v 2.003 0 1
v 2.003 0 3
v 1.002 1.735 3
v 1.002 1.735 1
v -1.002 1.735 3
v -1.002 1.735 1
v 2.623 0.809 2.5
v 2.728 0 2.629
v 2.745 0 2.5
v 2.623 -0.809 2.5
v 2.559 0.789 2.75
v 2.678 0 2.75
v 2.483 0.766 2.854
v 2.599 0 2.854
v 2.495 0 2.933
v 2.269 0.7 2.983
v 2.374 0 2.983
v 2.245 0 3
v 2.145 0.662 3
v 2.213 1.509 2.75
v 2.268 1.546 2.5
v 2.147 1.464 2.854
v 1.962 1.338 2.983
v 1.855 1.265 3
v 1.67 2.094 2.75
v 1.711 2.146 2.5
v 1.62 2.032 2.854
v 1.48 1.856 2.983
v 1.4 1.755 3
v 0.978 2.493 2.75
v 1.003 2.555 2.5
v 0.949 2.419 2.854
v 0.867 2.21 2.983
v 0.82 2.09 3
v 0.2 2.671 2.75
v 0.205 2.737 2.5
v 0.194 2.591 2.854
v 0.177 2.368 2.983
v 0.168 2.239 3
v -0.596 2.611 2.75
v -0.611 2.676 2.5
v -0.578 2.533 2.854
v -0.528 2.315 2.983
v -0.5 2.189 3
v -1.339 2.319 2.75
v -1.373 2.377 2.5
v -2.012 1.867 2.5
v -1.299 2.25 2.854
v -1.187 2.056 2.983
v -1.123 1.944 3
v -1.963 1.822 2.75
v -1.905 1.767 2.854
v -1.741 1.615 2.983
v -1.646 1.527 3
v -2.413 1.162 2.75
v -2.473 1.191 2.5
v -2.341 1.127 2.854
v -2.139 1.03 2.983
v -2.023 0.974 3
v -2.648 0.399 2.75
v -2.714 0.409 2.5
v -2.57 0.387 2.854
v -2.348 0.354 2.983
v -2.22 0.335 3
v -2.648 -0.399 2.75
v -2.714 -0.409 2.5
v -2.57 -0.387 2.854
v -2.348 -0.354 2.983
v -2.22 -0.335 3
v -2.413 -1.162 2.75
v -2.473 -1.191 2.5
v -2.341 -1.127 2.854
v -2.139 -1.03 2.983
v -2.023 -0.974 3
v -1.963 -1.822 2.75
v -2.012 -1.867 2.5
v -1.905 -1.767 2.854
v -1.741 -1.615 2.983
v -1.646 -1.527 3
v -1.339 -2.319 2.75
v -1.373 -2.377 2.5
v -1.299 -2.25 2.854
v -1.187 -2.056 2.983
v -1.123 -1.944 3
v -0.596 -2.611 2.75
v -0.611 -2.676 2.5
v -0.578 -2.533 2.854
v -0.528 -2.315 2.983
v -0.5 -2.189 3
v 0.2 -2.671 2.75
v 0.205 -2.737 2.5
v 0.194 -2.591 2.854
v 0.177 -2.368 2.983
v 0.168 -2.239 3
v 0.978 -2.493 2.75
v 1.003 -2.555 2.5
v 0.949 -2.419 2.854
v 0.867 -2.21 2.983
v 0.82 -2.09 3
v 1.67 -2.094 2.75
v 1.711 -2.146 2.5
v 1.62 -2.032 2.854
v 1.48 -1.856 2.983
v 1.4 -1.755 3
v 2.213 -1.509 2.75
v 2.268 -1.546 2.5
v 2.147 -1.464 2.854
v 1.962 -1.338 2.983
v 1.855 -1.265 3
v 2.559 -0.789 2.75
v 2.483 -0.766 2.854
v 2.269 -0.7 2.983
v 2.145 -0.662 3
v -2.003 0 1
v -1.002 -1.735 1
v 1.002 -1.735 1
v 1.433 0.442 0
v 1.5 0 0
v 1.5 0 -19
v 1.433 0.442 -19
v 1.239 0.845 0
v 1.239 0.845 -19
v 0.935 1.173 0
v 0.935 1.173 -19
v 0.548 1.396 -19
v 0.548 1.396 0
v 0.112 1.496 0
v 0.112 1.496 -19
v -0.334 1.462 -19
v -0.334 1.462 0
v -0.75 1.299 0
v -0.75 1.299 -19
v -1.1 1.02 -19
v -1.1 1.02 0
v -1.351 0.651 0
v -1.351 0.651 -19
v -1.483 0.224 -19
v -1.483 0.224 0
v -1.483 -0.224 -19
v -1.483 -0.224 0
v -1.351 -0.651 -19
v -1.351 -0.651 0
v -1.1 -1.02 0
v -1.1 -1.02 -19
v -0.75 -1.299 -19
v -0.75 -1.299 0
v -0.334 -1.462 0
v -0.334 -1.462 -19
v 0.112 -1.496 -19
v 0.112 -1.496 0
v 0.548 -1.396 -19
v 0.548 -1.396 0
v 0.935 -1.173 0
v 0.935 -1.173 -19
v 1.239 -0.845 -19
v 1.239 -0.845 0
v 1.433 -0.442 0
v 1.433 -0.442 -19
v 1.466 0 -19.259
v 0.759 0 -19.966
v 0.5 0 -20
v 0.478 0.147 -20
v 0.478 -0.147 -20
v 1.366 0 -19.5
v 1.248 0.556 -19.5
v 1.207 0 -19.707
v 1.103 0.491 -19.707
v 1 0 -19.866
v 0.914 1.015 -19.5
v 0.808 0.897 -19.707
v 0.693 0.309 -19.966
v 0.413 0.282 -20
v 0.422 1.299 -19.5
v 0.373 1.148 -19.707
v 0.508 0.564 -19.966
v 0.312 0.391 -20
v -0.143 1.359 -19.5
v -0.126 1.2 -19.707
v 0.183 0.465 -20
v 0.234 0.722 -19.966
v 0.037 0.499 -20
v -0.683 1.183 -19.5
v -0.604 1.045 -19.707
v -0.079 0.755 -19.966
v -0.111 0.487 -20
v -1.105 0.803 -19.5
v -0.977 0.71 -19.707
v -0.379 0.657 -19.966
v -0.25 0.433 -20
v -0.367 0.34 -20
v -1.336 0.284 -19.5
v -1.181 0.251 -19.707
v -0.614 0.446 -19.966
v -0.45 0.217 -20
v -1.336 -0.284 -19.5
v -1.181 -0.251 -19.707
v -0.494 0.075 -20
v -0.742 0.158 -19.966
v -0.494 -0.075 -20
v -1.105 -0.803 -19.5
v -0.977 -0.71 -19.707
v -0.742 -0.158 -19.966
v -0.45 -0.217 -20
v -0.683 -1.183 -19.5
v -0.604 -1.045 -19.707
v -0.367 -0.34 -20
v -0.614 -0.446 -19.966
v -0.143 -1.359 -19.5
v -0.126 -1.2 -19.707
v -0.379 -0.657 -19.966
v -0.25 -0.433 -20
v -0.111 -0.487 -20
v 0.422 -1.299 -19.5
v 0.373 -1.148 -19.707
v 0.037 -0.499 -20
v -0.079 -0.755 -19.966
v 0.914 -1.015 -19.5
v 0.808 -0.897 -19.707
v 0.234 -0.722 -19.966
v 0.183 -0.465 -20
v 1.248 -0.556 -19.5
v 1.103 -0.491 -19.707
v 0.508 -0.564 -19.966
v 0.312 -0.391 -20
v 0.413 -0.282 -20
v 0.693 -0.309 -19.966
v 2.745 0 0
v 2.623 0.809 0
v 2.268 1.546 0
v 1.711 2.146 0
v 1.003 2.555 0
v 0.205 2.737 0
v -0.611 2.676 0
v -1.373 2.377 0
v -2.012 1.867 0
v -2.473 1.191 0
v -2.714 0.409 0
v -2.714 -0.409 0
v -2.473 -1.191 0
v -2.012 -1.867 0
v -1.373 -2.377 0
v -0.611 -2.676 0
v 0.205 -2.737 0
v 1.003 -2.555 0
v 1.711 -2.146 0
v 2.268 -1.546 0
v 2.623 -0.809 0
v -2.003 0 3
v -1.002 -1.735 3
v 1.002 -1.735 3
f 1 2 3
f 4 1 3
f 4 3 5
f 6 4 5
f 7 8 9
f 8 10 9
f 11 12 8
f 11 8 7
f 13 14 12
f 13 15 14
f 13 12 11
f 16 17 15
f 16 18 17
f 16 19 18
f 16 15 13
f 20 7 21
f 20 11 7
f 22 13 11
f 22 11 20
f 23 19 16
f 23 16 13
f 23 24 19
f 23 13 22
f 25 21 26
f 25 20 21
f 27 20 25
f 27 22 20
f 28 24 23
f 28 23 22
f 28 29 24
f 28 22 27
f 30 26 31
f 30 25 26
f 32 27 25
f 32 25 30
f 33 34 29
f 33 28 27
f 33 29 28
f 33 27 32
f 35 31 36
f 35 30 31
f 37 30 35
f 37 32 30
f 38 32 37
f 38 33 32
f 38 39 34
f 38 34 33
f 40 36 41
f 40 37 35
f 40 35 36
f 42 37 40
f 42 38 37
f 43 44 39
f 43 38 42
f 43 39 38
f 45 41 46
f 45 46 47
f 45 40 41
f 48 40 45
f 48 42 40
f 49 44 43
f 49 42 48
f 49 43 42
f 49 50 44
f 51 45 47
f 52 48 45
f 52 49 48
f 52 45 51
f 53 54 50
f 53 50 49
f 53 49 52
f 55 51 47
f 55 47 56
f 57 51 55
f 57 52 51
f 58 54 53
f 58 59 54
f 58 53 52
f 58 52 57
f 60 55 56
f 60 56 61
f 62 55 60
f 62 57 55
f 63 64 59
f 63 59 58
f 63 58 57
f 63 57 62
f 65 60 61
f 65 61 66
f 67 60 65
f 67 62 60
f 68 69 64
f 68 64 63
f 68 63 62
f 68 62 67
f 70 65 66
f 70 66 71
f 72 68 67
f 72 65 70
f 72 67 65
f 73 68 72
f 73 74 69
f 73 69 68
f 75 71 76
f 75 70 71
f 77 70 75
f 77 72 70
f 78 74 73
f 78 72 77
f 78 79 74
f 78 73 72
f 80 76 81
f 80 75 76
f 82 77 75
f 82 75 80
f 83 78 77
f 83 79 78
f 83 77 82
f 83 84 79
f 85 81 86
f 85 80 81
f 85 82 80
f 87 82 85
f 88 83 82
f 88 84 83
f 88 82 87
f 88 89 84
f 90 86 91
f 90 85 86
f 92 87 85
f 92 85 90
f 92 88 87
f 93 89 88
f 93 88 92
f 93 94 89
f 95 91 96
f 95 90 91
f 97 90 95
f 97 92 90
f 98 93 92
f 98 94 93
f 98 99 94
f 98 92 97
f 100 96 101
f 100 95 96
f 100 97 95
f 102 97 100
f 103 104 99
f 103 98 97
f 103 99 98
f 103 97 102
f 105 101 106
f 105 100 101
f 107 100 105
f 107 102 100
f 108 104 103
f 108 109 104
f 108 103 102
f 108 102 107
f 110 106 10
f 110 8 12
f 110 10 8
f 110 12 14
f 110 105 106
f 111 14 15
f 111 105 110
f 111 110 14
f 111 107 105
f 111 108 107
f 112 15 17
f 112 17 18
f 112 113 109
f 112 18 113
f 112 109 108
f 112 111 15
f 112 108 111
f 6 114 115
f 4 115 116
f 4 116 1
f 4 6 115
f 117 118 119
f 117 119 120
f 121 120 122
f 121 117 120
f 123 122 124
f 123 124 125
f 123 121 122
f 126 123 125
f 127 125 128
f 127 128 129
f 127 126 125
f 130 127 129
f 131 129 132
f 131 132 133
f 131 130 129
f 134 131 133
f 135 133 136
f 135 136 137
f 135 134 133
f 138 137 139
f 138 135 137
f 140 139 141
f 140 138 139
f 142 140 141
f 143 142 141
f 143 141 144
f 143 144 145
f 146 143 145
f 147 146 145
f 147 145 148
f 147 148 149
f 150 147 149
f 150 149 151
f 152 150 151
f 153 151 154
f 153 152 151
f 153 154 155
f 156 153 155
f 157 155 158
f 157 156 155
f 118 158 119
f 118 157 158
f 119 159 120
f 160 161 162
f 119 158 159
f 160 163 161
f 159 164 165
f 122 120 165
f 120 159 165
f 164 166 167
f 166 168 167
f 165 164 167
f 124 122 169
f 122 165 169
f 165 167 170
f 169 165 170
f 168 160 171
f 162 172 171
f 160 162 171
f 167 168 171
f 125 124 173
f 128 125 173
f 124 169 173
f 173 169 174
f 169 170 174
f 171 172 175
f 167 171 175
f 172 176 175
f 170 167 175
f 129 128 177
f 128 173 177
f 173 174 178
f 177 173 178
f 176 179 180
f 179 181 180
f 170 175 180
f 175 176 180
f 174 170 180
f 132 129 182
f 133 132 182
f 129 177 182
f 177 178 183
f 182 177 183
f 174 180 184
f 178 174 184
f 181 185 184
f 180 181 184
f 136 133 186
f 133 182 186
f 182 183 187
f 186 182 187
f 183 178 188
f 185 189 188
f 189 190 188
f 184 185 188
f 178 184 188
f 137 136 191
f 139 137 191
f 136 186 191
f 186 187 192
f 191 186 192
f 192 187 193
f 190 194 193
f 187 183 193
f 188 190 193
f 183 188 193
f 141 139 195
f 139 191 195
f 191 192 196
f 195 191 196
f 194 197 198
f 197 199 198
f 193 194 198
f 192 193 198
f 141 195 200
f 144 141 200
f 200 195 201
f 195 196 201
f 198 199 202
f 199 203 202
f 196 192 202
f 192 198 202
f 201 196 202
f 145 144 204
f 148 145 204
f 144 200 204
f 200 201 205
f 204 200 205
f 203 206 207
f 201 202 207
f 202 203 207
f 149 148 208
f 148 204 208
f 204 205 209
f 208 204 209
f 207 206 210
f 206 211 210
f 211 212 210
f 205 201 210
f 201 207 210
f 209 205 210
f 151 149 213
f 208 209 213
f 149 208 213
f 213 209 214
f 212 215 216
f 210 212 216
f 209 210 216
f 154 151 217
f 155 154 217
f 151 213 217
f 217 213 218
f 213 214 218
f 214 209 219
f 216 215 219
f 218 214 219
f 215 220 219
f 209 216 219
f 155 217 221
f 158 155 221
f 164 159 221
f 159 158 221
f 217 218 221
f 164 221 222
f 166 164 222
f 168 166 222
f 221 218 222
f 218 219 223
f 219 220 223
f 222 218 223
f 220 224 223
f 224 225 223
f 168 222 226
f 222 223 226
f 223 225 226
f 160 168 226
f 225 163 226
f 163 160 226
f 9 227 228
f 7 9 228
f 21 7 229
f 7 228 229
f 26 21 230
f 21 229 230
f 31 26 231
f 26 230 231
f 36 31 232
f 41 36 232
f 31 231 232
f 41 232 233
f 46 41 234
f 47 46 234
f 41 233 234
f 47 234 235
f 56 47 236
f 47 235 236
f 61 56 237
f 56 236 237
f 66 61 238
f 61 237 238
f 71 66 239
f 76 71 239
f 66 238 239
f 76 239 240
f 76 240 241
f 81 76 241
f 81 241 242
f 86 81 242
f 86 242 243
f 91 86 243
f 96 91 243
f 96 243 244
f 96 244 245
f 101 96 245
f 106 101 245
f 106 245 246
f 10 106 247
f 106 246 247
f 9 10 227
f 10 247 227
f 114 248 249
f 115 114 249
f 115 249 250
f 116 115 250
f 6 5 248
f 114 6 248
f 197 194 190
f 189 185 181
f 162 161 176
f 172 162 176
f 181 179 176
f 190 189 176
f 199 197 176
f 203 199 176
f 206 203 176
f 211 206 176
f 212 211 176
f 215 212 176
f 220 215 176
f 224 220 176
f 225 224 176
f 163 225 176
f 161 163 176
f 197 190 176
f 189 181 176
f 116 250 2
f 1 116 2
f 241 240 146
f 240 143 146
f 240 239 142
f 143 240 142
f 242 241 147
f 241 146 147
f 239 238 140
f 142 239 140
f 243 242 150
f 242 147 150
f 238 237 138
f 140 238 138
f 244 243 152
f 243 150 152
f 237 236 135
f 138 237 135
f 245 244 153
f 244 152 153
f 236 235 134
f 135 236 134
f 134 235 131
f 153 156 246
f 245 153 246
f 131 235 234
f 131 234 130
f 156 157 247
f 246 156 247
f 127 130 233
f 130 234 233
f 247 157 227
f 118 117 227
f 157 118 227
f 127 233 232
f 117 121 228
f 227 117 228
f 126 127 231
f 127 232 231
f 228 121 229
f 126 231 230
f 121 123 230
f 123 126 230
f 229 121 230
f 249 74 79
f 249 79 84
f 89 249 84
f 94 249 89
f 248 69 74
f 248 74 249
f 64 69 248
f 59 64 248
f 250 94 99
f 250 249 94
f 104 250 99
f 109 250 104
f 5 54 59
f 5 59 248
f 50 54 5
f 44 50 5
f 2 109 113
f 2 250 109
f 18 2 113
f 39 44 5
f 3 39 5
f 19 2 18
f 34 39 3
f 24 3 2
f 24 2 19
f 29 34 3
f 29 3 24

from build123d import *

# Parameters (mm, degrees)
SKETCH1_R          = 1.5
EXTRUDE1_DEPTH     = 20
SKETCH2_R          = 2.745016825
EXTRUDE2_DEPTH     = 3
CUT_EXTRUDE1_DEPTH = 2
FILLET1_R          = 0.5
FILLET2_R          = 1


with BuildPart() as part:
    # Sketch1 → Extrude1 (new body)
    with BuildSketch(Plane.XY):
        Circle(SKETCH1_R)
    extrude(amount=-EXTRUDE1_DEPTH)

    # Sketch2 → Extrude2 (add)
    with BuildSketch(Plane.XY):
        Circle(SKETCH2_R)
    extrude(amount=EXTRUDE2_DEPTH)

    # Sketch3 → Cut-Extrude1 (cut)
    with BuildSketch(Plane.XY.offset(3)):
        Polygon((-2.003123501, 0), (-1.00156175, -1.734755838), (1.00156175, -1.734755838), (2.003123501, 0), (1.00156175, 1.734755838), (-1.00156175, 1.734755838), align=None)
    extrude(amount=-CUT_EXTRUDE1_DEPTH, mode=Mode.SUBTRACT)

    # Fillet1
    fillet1_edges = [part.edges().sort_by_distance(p)[0] for p in [
        (-2.745016825, 0, 3),
    ]]
    fillet(fillet1_edges, radius=FILLET1_R)

    # Fillet2
    fillet2_edges = [part.edges().sort_by_distance(p)[0] for p in [
        (-1.5, 0, -20),
    ]]
    fillet(fillet2_edges, radius=FILLET2_R)


solid = part.part
